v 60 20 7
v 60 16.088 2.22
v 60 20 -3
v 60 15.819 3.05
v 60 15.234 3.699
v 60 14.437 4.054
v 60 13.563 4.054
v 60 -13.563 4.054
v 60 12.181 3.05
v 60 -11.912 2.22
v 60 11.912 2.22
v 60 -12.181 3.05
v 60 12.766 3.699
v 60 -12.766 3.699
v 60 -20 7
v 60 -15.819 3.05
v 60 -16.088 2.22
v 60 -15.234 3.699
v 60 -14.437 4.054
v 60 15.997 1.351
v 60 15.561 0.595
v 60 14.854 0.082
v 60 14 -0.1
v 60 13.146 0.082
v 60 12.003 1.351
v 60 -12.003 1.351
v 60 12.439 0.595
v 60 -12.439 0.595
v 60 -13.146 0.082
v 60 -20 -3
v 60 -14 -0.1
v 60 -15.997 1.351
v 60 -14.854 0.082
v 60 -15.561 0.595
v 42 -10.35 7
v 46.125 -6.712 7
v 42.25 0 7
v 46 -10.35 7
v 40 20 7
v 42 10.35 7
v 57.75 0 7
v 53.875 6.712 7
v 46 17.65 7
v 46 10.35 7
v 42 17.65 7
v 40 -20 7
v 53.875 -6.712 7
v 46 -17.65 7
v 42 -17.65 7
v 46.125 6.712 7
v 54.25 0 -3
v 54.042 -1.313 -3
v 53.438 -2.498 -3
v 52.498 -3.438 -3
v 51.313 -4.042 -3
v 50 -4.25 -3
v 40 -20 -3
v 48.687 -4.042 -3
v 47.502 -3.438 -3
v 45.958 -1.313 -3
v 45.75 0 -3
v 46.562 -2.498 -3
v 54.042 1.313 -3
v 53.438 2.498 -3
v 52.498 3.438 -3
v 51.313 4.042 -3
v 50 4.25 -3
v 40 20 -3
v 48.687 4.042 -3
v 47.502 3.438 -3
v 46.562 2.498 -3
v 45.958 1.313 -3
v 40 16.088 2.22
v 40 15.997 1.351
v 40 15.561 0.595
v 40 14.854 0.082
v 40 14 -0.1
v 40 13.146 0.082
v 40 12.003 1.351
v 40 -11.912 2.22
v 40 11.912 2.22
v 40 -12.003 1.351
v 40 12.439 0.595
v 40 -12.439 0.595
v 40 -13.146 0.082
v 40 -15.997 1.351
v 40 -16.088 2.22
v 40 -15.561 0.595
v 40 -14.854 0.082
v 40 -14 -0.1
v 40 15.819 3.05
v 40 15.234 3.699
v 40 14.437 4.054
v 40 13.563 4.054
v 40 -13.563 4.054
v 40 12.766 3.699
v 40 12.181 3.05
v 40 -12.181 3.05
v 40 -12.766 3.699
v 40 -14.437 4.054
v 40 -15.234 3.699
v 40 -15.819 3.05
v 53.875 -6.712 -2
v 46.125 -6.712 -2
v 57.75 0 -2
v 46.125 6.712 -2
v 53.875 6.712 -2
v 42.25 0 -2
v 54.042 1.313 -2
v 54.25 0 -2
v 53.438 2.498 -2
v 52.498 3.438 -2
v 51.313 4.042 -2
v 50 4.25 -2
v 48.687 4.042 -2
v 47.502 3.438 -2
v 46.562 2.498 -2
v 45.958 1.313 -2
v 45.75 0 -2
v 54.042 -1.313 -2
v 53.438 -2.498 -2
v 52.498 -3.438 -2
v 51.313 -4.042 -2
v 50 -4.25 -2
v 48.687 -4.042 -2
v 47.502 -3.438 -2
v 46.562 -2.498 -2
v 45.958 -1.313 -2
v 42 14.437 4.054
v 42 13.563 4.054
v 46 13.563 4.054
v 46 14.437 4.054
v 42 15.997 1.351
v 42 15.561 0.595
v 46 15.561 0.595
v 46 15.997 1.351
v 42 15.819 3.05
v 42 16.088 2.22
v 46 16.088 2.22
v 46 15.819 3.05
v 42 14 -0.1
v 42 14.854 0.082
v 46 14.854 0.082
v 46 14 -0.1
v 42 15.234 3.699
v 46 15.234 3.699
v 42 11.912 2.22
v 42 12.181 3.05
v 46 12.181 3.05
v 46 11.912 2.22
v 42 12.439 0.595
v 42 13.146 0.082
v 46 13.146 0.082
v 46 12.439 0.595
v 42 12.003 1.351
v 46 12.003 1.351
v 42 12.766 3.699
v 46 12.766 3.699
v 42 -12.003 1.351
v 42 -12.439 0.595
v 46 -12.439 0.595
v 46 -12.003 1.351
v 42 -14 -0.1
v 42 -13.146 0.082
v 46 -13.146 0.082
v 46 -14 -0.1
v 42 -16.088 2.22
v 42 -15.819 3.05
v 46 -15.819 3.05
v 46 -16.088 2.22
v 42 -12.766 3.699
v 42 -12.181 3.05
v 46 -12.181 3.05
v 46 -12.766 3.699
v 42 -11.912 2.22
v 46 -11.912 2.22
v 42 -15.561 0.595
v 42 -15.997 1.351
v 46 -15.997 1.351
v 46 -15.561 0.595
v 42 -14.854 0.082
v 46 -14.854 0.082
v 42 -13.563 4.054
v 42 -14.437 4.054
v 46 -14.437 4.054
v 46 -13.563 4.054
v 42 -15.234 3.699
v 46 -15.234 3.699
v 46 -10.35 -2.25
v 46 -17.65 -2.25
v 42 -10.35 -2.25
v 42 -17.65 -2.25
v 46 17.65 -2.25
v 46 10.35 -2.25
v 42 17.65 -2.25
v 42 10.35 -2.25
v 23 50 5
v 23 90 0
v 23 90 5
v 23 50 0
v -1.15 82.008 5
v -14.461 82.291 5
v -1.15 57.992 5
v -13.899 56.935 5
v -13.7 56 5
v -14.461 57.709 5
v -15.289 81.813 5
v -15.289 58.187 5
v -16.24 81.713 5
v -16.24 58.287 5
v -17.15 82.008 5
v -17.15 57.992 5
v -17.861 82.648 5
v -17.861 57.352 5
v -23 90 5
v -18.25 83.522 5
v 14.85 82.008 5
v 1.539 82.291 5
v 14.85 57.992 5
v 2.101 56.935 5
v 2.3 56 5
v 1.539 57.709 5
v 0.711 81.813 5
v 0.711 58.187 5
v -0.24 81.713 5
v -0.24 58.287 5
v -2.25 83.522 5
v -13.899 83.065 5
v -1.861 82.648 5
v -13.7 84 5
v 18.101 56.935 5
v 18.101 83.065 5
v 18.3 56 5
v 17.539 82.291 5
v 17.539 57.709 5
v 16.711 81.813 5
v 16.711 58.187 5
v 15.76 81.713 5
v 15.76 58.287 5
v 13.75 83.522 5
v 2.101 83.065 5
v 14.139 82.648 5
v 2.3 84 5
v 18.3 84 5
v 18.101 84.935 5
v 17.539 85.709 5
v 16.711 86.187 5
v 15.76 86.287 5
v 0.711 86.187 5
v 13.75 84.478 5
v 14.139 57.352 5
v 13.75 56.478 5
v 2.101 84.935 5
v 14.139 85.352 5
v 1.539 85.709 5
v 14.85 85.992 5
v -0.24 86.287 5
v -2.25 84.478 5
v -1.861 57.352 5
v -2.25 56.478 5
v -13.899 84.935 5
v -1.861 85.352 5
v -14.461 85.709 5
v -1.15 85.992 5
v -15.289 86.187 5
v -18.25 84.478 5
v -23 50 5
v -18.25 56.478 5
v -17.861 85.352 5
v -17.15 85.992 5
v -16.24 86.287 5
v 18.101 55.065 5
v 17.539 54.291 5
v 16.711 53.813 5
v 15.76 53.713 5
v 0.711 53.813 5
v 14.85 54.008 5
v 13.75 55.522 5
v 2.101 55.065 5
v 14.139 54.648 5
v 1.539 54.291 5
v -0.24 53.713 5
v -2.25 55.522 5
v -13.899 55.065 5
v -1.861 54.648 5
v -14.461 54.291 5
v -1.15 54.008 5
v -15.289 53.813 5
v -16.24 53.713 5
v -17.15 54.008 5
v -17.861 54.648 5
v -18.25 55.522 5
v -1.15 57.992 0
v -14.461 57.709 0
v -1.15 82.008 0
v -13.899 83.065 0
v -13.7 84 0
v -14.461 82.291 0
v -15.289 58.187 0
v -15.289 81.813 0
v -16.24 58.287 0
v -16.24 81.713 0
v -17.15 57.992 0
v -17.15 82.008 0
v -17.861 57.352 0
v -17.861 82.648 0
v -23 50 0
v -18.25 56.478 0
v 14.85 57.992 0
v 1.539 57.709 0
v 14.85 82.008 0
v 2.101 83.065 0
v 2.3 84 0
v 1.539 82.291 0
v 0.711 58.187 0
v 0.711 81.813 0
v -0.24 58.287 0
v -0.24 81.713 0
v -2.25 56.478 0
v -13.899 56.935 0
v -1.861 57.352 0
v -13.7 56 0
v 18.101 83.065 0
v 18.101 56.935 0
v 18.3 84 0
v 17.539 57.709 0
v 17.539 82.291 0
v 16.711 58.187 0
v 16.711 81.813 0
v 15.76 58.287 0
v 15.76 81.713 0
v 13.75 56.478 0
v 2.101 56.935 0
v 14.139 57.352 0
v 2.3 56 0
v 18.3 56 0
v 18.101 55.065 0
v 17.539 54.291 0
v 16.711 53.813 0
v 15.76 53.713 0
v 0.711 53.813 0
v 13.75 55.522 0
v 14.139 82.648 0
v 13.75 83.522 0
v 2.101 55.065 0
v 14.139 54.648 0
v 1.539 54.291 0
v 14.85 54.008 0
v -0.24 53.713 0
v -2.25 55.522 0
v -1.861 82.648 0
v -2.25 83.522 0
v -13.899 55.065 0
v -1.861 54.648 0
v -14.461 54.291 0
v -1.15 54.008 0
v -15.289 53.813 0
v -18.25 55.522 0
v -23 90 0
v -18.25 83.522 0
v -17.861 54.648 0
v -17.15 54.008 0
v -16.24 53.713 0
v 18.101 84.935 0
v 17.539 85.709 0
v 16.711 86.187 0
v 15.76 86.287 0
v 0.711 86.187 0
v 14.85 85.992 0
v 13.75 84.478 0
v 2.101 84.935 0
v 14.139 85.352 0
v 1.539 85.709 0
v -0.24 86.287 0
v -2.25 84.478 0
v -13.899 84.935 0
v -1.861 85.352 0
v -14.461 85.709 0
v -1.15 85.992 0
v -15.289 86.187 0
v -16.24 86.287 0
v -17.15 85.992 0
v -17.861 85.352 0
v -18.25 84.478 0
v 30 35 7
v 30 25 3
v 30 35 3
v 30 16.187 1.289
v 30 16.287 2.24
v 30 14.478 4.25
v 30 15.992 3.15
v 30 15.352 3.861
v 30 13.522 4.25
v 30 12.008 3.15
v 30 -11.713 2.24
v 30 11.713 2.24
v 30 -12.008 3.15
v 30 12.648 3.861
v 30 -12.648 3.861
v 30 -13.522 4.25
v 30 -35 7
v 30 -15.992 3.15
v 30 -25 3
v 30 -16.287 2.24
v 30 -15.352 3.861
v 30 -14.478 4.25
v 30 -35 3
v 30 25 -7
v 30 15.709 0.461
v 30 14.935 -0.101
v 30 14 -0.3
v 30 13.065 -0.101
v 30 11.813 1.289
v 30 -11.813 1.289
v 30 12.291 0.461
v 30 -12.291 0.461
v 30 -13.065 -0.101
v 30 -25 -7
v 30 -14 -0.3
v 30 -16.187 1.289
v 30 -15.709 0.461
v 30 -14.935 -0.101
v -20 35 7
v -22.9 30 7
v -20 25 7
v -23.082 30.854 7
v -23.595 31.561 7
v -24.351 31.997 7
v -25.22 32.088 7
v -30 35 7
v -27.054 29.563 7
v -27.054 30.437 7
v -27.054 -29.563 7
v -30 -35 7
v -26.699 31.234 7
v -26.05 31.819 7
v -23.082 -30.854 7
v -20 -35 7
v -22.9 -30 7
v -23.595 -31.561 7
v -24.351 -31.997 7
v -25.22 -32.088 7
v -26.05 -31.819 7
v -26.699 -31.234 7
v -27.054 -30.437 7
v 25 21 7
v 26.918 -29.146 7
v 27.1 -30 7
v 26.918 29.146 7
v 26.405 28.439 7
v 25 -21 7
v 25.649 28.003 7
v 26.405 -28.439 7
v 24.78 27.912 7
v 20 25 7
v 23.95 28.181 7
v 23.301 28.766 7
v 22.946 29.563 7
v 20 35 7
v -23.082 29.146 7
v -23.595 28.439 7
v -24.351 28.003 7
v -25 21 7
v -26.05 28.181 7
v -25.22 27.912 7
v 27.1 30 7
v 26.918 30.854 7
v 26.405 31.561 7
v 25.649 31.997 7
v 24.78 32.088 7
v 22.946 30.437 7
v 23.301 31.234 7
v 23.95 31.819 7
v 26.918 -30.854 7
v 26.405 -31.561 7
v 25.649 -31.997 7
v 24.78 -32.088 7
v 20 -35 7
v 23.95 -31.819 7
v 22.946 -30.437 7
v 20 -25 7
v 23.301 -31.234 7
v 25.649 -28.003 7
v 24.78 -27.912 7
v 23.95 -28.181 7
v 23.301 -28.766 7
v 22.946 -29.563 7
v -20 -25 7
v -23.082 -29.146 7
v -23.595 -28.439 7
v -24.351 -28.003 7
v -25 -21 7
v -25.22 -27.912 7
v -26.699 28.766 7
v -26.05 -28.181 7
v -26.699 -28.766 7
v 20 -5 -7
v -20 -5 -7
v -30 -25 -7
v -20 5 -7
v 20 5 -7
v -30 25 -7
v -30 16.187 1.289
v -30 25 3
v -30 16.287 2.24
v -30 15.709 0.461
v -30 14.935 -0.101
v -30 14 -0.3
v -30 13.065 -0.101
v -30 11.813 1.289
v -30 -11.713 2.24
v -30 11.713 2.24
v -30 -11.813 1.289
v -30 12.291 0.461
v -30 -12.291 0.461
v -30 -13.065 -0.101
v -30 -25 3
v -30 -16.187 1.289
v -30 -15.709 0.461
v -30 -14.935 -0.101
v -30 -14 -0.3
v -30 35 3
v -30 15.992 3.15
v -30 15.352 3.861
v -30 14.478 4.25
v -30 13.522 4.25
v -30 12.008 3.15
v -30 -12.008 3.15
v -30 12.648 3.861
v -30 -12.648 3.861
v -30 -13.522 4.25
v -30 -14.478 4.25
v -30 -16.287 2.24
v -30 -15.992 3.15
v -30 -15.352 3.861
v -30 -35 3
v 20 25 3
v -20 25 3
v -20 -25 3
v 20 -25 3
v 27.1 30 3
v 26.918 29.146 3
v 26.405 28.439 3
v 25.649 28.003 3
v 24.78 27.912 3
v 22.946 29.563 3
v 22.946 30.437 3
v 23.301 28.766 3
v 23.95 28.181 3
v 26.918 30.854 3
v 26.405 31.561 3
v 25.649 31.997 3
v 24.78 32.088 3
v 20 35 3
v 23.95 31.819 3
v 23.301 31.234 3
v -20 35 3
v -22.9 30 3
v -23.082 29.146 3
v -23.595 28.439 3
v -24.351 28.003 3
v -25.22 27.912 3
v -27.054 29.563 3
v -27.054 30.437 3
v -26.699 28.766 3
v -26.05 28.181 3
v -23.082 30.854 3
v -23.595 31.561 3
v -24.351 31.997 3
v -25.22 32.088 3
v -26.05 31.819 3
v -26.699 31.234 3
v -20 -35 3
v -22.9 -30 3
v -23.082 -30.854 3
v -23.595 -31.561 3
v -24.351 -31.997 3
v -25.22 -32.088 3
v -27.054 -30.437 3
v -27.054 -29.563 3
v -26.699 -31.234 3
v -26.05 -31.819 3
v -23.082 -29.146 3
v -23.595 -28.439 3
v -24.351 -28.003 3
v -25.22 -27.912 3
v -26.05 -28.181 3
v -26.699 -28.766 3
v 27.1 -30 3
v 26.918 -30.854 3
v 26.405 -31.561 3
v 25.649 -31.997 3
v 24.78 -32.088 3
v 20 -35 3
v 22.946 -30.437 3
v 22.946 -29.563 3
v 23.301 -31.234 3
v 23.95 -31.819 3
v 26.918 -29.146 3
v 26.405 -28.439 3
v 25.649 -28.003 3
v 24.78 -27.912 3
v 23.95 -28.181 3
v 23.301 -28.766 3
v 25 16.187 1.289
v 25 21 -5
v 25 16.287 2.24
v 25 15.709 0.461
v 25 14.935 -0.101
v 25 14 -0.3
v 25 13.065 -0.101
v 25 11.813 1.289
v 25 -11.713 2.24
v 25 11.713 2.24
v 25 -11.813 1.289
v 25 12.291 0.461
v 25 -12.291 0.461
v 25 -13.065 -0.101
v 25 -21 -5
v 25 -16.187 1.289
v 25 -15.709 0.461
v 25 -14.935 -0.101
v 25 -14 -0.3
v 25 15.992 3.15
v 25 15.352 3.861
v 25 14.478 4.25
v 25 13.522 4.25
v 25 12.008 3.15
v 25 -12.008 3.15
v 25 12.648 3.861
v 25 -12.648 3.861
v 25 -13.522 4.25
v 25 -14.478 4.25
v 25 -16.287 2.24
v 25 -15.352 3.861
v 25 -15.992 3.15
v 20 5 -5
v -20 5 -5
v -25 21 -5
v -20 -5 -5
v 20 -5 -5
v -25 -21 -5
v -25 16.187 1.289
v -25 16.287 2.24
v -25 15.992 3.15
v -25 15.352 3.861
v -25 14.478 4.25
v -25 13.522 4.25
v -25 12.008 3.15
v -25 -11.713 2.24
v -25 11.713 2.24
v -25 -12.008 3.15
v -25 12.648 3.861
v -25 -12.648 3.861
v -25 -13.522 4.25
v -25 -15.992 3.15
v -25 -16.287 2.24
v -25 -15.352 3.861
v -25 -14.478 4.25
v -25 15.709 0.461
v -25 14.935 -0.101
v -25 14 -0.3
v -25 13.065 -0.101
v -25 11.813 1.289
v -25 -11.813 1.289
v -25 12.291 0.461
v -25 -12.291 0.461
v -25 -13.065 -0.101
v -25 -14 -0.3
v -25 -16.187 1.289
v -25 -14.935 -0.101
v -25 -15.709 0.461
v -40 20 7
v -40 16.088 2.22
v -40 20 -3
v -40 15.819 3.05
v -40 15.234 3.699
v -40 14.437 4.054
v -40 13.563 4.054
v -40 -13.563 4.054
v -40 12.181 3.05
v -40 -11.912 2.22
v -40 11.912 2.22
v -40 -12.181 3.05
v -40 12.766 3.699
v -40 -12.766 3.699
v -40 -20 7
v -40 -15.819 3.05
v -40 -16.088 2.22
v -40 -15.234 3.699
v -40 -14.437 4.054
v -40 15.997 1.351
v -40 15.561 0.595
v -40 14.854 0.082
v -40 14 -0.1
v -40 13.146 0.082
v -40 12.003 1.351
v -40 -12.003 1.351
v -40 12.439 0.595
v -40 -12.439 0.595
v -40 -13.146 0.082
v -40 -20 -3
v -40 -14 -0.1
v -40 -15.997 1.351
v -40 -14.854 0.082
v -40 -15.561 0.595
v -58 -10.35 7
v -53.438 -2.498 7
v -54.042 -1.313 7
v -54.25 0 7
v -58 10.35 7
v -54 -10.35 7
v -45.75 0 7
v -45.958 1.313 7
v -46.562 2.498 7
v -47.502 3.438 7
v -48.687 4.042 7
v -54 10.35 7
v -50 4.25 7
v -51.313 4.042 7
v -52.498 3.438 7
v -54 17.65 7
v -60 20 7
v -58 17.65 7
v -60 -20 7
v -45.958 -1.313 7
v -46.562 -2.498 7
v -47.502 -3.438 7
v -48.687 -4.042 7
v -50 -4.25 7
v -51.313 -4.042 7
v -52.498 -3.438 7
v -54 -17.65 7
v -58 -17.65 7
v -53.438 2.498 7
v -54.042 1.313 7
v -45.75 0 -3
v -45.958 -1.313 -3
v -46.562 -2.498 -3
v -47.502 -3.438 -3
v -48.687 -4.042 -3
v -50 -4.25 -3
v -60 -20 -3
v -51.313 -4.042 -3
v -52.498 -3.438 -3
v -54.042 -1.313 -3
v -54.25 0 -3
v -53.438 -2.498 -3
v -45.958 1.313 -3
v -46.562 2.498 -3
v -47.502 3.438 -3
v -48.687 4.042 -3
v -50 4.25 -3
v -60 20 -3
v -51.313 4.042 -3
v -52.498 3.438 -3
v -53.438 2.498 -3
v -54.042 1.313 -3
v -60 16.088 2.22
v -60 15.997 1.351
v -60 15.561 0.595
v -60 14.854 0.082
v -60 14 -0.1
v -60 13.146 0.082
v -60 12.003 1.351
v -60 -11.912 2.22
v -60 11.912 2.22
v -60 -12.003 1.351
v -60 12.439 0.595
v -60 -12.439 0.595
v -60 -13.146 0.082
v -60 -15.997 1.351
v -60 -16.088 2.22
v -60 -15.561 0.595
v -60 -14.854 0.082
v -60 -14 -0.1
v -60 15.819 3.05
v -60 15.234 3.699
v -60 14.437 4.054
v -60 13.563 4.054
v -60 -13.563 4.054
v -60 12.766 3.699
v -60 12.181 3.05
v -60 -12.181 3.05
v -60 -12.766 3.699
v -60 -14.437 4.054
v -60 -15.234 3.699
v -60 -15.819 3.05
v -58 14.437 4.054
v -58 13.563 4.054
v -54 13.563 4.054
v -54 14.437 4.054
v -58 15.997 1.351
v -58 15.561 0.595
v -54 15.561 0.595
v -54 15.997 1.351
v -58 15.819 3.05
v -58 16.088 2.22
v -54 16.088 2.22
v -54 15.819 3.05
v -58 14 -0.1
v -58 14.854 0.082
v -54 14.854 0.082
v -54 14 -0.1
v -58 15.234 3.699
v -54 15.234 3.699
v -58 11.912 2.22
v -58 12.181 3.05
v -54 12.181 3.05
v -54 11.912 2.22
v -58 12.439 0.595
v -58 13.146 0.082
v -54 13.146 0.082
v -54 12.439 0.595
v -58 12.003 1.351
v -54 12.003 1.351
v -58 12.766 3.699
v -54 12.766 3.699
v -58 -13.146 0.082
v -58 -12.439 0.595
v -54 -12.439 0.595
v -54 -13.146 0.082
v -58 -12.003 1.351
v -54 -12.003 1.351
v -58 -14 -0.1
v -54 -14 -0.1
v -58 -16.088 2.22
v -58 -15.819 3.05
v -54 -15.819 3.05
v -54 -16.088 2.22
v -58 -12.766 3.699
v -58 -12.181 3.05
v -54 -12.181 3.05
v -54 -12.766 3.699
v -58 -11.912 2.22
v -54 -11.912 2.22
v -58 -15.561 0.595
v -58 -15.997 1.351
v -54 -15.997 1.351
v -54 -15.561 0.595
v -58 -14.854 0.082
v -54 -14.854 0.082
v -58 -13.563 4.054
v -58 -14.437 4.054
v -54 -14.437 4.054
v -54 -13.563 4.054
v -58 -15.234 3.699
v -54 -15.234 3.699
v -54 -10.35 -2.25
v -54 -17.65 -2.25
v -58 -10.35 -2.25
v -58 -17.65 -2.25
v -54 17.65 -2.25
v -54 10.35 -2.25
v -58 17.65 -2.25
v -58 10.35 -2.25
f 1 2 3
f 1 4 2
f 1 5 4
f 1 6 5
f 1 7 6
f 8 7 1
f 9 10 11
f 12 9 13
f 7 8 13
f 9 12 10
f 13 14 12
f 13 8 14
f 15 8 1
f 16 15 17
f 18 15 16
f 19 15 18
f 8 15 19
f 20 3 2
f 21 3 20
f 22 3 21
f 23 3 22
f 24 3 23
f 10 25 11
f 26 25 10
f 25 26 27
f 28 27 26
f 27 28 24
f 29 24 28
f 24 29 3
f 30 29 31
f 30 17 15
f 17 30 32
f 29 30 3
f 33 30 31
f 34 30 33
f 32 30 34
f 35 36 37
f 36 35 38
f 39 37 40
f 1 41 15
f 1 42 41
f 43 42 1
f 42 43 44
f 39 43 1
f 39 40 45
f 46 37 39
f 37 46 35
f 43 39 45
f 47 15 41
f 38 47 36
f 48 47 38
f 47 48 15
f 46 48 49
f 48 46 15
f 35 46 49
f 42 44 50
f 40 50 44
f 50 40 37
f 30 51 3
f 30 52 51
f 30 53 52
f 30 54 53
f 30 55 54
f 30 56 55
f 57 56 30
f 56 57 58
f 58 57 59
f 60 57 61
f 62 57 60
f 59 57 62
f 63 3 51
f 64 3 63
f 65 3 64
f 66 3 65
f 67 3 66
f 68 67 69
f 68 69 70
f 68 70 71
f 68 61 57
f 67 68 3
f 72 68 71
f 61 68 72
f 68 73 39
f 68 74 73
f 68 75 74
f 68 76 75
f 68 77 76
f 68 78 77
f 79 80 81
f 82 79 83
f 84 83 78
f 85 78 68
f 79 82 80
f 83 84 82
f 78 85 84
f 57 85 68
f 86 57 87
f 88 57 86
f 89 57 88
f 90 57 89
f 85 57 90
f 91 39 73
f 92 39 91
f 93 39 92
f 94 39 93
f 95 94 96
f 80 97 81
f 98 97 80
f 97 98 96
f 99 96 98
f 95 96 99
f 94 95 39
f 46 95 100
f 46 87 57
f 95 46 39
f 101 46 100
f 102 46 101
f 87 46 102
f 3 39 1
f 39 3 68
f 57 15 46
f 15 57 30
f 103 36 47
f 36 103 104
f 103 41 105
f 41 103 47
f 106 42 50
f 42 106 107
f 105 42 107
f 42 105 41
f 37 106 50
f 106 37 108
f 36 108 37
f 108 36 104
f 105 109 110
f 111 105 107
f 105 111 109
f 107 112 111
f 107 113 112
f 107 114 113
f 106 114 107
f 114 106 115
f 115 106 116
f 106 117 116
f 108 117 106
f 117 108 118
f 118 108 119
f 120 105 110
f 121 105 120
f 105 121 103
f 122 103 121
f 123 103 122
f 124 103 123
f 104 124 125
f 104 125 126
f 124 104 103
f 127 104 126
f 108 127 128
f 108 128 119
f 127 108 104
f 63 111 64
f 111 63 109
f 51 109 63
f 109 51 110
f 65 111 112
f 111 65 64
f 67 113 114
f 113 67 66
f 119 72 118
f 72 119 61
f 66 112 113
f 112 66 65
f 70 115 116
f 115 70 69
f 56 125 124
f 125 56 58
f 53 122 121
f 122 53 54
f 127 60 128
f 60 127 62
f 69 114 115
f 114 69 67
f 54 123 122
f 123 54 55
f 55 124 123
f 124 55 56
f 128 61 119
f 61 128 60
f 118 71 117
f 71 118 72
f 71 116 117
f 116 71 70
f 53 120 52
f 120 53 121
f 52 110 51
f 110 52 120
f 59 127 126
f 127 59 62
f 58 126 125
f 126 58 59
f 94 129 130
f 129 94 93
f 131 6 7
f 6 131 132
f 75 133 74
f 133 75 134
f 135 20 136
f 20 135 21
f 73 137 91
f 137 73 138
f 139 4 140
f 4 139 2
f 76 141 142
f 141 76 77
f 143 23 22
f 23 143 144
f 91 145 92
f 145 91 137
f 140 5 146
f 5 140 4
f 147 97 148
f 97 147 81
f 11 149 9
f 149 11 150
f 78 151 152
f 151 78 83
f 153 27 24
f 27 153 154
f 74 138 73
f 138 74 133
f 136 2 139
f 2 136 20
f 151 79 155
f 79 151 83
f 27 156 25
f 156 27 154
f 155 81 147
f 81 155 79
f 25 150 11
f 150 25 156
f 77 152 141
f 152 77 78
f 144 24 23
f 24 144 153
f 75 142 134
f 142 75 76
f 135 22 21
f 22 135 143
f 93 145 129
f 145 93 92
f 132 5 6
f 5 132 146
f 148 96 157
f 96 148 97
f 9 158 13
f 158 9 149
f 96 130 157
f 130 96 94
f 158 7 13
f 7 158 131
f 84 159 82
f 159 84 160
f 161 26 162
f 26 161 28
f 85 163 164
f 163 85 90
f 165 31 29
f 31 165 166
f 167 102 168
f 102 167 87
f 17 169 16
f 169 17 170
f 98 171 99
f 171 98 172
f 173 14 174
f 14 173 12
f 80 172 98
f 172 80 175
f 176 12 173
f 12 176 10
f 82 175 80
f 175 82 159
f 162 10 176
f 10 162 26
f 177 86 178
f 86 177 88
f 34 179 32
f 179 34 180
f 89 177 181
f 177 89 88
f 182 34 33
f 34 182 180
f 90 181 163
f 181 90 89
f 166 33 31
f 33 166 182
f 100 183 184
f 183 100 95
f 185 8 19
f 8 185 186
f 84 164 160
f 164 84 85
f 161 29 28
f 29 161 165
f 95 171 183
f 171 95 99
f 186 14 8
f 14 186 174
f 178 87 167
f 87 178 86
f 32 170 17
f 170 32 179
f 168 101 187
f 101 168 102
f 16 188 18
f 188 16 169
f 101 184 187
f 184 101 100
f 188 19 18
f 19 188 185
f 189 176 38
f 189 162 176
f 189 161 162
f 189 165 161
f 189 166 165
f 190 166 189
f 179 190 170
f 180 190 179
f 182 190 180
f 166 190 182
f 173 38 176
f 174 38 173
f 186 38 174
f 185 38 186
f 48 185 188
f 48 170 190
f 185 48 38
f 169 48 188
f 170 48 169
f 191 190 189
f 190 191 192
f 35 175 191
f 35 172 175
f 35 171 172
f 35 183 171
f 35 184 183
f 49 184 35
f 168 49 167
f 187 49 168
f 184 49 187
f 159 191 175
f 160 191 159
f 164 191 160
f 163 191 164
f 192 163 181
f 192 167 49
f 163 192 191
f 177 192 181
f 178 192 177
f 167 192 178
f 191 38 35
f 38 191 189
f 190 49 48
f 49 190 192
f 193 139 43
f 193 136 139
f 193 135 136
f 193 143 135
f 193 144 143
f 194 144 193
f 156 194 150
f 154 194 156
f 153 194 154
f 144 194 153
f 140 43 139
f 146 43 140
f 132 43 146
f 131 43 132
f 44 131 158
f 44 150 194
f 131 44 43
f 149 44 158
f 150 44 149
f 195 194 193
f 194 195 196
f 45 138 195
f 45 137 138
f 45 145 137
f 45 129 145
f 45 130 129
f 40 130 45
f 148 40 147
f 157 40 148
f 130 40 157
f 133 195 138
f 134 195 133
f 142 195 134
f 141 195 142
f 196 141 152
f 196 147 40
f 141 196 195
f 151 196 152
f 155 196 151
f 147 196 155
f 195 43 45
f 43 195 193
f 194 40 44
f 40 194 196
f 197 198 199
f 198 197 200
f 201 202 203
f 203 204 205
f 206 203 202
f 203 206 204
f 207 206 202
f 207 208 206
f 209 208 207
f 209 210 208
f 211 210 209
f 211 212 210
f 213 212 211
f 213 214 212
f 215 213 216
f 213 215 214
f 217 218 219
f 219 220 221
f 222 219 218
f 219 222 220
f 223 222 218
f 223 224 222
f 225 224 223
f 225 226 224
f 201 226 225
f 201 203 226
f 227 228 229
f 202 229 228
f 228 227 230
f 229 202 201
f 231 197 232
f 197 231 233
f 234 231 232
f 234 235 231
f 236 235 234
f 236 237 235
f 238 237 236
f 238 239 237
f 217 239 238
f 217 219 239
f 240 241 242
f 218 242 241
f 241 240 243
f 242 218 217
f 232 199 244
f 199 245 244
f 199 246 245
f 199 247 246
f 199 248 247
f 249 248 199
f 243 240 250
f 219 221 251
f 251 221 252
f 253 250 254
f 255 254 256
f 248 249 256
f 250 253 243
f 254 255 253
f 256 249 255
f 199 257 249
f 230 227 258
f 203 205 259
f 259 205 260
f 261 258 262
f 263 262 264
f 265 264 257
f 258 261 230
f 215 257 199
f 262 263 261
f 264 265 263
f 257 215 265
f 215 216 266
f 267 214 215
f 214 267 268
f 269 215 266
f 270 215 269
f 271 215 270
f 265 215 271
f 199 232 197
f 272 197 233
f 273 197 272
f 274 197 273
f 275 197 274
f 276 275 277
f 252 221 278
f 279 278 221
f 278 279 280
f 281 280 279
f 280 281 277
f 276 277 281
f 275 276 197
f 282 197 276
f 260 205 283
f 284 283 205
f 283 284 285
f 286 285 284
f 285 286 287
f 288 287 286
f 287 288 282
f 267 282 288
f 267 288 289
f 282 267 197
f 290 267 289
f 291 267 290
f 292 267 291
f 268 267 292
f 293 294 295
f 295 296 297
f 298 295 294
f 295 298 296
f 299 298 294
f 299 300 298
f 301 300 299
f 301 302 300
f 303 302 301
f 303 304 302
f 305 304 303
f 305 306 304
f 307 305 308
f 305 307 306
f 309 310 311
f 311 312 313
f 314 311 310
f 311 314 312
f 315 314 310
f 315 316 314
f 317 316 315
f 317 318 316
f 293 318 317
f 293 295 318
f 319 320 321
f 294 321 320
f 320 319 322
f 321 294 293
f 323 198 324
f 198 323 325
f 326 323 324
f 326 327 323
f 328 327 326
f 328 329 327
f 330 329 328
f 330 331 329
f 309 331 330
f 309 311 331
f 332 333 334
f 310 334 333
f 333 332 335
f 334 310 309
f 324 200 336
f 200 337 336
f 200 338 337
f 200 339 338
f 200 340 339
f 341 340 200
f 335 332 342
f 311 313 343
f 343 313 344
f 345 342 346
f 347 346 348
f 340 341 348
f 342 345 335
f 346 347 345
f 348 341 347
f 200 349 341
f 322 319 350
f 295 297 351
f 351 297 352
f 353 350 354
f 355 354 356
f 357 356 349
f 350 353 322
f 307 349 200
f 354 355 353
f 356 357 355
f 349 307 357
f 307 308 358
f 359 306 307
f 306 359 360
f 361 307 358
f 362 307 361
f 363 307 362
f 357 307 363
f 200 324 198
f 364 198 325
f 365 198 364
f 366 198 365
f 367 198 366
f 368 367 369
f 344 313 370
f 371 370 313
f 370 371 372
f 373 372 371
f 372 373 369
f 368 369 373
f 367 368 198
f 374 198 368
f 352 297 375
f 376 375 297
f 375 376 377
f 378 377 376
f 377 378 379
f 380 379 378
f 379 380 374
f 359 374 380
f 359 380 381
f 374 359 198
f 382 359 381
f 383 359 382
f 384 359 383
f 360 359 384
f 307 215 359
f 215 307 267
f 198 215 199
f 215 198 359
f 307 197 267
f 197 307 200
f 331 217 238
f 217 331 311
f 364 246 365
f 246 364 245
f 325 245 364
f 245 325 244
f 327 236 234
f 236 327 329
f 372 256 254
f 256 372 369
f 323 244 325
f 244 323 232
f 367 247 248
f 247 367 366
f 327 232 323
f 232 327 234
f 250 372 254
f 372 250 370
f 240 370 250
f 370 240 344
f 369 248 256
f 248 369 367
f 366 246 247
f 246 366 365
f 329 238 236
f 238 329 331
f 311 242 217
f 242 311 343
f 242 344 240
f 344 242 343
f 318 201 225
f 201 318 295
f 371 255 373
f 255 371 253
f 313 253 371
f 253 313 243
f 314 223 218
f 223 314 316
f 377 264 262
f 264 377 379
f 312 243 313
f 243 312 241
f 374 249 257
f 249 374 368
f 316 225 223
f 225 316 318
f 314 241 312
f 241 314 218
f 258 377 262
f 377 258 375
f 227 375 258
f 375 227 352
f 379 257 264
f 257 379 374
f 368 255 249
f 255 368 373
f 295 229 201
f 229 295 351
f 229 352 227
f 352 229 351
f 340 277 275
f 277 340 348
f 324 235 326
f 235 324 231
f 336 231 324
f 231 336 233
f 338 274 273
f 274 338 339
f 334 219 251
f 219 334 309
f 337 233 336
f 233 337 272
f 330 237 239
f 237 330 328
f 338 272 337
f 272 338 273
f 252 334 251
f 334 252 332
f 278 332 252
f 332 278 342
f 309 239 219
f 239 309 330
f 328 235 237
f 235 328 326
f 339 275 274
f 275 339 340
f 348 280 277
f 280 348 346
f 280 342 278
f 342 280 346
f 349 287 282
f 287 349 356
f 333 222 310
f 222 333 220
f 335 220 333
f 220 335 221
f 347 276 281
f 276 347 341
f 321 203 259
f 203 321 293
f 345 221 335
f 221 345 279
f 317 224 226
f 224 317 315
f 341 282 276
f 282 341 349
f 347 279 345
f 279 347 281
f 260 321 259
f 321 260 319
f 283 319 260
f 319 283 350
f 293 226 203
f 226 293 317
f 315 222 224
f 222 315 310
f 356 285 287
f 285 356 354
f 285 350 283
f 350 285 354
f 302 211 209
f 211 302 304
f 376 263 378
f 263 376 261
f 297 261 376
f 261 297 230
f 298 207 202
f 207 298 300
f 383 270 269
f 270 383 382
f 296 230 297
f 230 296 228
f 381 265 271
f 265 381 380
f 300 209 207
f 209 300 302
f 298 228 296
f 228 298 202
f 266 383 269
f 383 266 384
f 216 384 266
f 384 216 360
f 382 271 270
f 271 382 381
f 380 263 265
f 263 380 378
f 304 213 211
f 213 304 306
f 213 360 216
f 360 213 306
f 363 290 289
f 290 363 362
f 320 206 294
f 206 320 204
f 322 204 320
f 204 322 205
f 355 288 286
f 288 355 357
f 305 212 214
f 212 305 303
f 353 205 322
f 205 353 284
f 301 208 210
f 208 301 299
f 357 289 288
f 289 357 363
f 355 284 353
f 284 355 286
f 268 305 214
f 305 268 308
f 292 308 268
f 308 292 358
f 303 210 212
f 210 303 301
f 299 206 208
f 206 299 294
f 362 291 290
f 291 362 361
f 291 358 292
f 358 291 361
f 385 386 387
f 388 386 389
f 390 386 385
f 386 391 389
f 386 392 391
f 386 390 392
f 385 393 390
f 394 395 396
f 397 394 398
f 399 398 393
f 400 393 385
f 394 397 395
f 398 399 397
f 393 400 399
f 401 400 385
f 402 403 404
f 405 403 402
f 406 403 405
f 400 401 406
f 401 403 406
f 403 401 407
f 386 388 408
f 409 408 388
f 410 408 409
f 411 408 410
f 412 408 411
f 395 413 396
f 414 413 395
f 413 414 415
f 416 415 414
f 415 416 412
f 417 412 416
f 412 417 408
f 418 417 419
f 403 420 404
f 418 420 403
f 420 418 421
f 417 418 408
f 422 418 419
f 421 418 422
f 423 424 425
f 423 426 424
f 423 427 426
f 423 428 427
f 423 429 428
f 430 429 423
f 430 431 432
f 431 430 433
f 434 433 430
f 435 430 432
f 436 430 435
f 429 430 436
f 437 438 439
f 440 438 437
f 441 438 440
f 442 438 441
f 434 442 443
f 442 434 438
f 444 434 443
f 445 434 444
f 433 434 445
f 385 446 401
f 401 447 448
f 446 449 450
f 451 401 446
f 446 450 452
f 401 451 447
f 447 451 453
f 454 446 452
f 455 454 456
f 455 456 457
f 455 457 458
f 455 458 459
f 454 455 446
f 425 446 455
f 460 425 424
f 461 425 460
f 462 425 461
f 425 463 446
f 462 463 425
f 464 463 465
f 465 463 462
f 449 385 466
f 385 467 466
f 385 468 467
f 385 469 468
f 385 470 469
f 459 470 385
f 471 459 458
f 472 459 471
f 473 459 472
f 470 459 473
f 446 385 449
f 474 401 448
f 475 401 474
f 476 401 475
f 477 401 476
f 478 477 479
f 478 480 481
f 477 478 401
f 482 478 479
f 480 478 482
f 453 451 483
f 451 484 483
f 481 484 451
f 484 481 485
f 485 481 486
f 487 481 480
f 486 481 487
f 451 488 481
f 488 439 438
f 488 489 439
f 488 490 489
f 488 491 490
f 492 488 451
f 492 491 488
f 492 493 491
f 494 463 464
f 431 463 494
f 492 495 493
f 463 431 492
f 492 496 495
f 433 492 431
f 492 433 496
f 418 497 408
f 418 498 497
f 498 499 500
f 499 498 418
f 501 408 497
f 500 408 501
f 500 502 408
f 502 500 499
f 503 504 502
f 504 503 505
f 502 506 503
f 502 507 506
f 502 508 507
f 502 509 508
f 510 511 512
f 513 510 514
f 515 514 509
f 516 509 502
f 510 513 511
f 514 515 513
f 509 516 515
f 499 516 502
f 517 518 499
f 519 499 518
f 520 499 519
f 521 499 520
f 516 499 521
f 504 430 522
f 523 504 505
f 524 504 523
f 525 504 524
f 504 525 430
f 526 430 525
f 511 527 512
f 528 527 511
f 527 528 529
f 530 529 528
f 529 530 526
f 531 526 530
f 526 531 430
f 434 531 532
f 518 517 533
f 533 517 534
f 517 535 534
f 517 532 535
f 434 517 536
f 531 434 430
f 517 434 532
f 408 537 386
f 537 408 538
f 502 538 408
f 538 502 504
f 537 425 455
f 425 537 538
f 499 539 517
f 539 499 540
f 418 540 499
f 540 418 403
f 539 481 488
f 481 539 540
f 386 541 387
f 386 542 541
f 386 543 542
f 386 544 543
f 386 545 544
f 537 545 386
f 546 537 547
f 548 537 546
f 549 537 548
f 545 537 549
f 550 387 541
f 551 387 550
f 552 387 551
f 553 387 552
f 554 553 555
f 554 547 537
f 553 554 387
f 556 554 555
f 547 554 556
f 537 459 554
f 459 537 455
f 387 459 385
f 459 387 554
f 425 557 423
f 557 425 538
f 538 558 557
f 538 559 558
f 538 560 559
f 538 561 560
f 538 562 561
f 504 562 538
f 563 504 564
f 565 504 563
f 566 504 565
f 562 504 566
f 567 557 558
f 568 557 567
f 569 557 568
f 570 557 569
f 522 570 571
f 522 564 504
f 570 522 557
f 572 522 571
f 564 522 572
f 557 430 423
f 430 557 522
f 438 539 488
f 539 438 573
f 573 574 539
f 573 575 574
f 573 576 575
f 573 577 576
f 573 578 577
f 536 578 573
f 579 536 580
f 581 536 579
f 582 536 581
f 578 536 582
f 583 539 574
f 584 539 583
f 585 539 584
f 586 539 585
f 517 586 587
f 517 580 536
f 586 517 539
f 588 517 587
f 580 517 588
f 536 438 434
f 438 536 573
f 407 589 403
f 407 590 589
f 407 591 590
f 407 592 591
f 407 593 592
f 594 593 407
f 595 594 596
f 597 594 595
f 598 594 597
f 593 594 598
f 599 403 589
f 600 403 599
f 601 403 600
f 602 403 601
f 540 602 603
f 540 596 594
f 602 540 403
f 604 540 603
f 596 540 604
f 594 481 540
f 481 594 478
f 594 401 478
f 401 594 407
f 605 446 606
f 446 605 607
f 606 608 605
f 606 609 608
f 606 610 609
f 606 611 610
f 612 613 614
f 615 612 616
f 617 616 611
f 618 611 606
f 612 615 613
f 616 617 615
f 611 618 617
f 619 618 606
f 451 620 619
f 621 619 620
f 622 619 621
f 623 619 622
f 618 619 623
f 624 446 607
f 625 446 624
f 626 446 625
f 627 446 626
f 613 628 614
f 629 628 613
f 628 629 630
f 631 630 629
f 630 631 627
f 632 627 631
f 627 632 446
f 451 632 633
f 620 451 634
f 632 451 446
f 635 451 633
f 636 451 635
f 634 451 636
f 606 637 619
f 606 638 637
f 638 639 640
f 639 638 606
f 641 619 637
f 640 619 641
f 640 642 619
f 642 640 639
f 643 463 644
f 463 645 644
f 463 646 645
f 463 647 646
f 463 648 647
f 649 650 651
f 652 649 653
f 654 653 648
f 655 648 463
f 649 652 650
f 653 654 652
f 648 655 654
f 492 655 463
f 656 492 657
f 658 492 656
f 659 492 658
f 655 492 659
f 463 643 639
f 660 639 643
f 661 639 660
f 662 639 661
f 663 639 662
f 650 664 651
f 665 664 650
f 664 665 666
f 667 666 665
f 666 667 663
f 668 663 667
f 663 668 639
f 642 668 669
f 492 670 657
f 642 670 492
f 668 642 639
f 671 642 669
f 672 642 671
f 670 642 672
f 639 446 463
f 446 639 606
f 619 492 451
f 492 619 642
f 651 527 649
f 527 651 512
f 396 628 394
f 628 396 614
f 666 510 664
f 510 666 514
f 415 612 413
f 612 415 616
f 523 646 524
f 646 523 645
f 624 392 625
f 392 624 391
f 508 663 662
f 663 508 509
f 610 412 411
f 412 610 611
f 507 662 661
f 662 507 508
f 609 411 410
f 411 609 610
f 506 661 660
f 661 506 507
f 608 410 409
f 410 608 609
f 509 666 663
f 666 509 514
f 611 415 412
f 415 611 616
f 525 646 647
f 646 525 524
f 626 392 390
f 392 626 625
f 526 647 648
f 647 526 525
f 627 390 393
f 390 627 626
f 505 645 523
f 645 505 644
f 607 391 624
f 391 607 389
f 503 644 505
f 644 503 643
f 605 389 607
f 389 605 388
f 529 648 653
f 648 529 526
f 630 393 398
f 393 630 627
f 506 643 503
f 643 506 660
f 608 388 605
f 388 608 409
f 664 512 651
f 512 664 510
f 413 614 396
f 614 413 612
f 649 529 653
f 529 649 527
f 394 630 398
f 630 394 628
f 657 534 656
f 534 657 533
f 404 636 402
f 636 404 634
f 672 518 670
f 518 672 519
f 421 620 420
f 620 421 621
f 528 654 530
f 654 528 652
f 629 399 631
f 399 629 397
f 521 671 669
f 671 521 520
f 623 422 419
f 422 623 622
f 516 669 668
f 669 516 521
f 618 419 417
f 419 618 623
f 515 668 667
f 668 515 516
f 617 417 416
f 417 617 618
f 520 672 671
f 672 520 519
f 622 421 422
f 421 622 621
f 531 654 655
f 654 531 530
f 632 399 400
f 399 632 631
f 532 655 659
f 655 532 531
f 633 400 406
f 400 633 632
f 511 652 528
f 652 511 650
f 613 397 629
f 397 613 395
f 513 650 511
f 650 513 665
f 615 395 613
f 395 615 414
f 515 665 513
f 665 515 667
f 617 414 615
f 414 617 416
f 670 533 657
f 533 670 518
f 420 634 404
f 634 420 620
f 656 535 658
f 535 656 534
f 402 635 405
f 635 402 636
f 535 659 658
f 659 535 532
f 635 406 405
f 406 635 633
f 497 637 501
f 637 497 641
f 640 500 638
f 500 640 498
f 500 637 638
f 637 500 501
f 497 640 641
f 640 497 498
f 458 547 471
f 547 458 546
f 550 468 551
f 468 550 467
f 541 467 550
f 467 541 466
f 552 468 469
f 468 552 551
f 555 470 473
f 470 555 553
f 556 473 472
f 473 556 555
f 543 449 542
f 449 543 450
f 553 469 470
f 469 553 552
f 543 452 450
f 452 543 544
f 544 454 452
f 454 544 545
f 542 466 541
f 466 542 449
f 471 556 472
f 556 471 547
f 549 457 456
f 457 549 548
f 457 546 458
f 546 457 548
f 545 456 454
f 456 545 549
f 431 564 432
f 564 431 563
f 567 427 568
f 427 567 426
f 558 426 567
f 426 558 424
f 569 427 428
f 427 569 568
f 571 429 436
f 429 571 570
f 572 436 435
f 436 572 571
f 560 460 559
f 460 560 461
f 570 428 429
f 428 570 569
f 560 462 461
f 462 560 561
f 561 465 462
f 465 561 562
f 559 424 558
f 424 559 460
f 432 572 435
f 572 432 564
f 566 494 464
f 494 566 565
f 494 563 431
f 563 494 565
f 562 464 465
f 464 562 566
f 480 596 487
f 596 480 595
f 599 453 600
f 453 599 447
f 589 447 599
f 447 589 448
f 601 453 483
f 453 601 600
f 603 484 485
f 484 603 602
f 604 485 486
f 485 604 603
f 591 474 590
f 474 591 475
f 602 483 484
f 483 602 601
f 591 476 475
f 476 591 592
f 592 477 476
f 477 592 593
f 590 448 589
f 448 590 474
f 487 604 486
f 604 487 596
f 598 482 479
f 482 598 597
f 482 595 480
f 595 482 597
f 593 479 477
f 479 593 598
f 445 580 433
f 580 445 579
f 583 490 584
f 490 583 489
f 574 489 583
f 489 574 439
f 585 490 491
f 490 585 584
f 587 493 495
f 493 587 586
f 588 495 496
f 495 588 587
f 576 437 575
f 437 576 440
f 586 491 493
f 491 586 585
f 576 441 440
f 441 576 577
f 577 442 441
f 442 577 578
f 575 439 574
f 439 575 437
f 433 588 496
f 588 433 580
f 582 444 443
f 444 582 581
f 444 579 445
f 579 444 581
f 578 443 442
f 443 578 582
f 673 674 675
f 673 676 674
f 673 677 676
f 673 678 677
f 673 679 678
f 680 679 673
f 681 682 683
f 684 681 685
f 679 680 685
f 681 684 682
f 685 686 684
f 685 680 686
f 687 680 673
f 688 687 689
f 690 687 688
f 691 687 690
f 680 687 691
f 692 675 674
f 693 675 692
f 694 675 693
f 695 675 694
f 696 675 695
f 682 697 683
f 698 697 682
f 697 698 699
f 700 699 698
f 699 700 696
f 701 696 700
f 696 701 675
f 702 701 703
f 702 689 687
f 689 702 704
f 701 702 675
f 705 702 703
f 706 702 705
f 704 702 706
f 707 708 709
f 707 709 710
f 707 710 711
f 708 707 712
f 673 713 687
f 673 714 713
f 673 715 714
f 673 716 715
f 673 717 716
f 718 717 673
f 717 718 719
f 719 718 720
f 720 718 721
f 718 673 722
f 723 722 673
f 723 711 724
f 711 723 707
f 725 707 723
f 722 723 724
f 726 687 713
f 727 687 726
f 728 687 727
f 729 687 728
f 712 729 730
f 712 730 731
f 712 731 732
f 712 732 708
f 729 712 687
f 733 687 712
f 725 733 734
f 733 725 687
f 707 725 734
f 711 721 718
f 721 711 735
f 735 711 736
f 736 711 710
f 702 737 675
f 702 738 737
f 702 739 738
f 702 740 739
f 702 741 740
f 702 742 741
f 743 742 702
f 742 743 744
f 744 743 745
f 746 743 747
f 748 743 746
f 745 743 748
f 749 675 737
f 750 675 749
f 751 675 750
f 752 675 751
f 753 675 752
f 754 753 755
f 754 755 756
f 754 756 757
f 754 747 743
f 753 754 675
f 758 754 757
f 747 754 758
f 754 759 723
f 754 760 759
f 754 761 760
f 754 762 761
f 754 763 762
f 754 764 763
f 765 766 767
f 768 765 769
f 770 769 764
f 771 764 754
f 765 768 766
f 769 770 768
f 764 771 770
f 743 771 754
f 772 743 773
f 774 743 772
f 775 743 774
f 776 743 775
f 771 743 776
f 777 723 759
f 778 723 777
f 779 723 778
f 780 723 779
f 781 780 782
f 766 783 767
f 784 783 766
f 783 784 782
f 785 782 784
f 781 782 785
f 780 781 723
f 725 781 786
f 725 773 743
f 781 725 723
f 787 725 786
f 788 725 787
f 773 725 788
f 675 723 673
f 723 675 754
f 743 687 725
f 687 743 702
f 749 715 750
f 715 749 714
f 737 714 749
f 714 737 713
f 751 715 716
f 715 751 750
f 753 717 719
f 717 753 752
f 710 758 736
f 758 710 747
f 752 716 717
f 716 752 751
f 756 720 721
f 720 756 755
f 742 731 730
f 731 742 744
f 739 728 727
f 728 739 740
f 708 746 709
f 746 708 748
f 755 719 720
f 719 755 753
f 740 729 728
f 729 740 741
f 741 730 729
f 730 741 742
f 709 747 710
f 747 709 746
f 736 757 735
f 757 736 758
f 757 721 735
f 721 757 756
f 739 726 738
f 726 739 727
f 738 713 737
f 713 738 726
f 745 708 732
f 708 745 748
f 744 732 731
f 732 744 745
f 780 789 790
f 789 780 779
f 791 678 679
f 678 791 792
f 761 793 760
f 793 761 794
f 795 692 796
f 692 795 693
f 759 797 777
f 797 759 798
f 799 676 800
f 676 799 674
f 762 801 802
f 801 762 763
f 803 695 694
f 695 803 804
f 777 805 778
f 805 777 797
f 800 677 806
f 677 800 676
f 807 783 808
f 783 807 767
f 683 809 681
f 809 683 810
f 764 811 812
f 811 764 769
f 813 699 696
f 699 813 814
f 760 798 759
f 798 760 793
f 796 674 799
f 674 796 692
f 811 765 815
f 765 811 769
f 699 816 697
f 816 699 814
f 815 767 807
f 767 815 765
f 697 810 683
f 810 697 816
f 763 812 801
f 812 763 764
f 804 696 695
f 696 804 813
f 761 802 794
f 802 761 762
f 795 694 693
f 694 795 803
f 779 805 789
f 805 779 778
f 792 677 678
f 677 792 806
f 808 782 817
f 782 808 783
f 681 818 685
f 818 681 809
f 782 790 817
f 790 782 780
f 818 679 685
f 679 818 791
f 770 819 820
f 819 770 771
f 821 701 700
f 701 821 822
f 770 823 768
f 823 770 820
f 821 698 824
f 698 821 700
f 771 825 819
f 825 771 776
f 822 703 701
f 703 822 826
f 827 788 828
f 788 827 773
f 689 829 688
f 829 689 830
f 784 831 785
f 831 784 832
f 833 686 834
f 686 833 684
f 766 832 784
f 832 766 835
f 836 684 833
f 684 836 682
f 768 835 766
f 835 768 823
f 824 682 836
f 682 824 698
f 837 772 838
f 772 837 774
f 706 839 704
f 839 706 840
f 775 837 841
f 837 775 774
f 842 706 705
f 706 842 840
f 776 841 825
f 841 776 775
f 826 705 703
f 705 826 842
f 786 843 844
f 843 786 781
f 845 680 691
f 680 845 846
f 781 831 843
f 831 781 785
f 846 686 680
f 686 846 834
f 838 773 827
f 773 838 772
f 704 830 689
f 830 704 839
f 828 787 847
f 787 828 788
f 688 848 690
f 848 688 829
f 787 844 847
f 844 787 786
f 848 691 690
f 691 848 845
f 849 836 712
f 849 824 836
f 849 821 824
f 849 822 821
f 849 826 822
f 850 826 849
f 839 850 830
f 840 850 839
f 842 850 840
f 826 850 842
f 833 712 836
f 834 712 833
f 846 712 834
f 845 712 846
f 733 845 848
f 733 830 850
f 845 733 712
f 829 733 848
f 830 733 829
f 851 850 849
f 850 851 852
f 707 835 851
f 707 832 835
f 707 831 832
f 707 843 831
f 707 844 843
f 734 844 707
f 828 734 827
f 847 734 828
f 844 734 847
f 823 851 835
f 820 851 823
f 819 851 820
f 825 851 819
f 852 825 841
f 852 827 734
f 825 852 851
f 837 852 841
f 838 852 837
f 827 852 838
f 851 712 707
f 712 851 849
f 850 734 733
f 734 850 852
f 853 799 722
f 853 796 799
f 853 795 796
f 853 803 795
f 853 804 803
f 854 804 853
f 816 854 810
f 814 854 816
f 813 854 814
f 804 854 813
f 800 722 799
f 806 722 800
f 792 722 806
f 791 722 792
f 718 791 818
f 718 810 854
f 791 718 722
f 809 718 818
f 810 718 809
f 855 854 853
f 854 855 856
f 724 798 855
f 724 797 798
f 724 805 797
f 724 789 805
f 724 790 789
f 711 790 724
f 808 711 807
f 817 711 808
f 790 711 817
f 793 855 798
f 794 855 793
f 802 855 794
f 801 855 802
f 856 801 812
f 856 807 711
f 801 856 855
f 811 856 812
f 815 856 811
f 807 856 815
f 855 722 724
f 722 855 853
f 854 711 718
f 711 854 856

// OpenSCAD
ancho_pared=6;

module tensor(){
	difference(){

		cube([20,40,10],center=true);
		
		translate([0,0,-4])
		cylinder(r=15.5/2,h=100, $fn=6);

		cylinder(r=8.5/2,h=100, center=true, $fn=20);


		translate([20,0,0]) rotate([0,0,0])
		cube([20,40,40],center=true);

		translate([0,14,0]) rotate([0,90,0])
		cylinder(r=4.2/2,h=100,center=true , $fn=15);

		translate([0,-14,0]) rotate([0,90,0])
		cylinder(r=4.2/2,h=100,center=true , $fn=15);

		translate([-6,-14,0.75]) rotate([0,0,0])
		cube([4,7.30,10],center=true);

		translate([-6,14,0.75]) rotate([0,0,0])
		cube([4,7.30,10],center=true);
	}
}
module placa(){
	difference(){	
		cube([ancho_pared+20+20,40,5],center=true);
		
		translate([ancho_pared+20/2,14,0]) rotate([0,0,0])
		cylinder(r=4.6/2,h=100,center=true , $fn=15);

		translate([0,14,0]) rotate([0,0,0])
		cylinder(r=4.6/2,h=100,center=true , $fn=15);

		translate([ancho_pared+20/2,-14,0]) rotate([0,0,0])
		cylinder(r=4.6/2,h=100,center=true , $fn=15);

		translate([0,-14,0]) rotate([0,0,0])
		cylinder(r=4.6/2,h=100,center=true , $fn=15);
		
		translate([-ancho_pared-20/2,14,0]) rotate([0,0,0])
		cylinder(r=4.6/2,h=100,center=true , $fn=15);

		translate([-ancho_pared-20/2,-14,0]) rotate([0,0,0])
		cylinder(r=4.6/2,h=100,center=true , $fn=15);
	

	}
}

module cubre_tensor(){
	difference(){
		
		//CUERPO CENTRAL
		union(){
			cube([60,50,14],center=true);
			
			translate([50/2,60/2,5]) rotate([0,0,0])
			//cylinder(r=10/2,h=14,center=true , $fn=15);
			cube([10,10,4],center=true);
			
			translate([-50/2,60/2,5]) rotate([0,0,0])
			cube([10,10,4],center=true);

			translate([-50/2,-60/2,5]) rotate([0,0,0])
			cube([10,10,4],center=true);

			translate([50/2,-60/2,5]) rotate([0,0,0])
			cube([10,10,4],center=true);
		}
		//VACIADO CUERPO CENTRAL
		translate([0,0,3]) rotate([0,0,0])
		cube([50,42,16],center=true);
		
		
		//AGUJERO TENSOR
		translate([0,14,2]) rotate([0,90,0])
		cylinder(r=4.6/2,h=100,center=true , $fn=15);
		//AGUJERO TENSOR
		translate([0,-14,2]) rotate([0,90,0])
		cylinder(r=4.6/2,h=100,center=true , $fn=15);
	
		//AGUJERO INFERIOR EJE

		cube ([40,10,100], center=true);


		//agujero montaje
		translate([50/2,60/2,0]) rotate([0,0,0])
		cylinder(r=4.2/2,h=100,center=true , $fn=15);
		
		translate([-50/2,60/2,0]) rotate([0,0,0])
		cylinder(r=4.2/2,h=100,center=true , $fn=15);

		translate([50/2,-60/2,0]) rotate([0,0,0])
		cylinder(r=4.2/2,h=100,center=true , $fn=15);

		translate([-50/2,-60/2,0]) rotate([0,0,0])
		cylinder(r=4.2/2,h=100,center=true , $fn=15);
		
	}
}

module tensor_liso(){
	difference(){

		cube([20,40,10],center=true);
		
		translate([0,0,-4])
		//cylinder(r=15.5/2,h=100, $fn=6);

		cylinder(r=8.5/2,h=100, center=true, $fn=20);


		translate([20,0,0]) rotate([0,0,0])
		cube([20,40,40],center=true);

		translate([0,14,0]) rotate([0,90,0])
		cylinder(r=4.2/2,h=100,center=true , $fn=15);

		translate([0,-14,0]) rotate([0,90,0])
		cylinder(r=4.2/2,h=100,center=true , $fn=15);

		translate([-6,-14,0.75]) rotate([0,0,0])
		cube([4,7.30,10],center=true);

		translate([-6,14,0.75]) rotate([0,0,0])
		cube([4,7.30,10],center=true);
	}
}


translate([50,0,2]) rotate([0,0,0])
tensor();

translate([0,70,2.5]) rotate([0,0,0])
placa();

translate([0,0,0]) rotate([0,0,0])
cubre_tensor();

translate([-50,0,2]) rotate([0,0,0])
tensor_liso();
